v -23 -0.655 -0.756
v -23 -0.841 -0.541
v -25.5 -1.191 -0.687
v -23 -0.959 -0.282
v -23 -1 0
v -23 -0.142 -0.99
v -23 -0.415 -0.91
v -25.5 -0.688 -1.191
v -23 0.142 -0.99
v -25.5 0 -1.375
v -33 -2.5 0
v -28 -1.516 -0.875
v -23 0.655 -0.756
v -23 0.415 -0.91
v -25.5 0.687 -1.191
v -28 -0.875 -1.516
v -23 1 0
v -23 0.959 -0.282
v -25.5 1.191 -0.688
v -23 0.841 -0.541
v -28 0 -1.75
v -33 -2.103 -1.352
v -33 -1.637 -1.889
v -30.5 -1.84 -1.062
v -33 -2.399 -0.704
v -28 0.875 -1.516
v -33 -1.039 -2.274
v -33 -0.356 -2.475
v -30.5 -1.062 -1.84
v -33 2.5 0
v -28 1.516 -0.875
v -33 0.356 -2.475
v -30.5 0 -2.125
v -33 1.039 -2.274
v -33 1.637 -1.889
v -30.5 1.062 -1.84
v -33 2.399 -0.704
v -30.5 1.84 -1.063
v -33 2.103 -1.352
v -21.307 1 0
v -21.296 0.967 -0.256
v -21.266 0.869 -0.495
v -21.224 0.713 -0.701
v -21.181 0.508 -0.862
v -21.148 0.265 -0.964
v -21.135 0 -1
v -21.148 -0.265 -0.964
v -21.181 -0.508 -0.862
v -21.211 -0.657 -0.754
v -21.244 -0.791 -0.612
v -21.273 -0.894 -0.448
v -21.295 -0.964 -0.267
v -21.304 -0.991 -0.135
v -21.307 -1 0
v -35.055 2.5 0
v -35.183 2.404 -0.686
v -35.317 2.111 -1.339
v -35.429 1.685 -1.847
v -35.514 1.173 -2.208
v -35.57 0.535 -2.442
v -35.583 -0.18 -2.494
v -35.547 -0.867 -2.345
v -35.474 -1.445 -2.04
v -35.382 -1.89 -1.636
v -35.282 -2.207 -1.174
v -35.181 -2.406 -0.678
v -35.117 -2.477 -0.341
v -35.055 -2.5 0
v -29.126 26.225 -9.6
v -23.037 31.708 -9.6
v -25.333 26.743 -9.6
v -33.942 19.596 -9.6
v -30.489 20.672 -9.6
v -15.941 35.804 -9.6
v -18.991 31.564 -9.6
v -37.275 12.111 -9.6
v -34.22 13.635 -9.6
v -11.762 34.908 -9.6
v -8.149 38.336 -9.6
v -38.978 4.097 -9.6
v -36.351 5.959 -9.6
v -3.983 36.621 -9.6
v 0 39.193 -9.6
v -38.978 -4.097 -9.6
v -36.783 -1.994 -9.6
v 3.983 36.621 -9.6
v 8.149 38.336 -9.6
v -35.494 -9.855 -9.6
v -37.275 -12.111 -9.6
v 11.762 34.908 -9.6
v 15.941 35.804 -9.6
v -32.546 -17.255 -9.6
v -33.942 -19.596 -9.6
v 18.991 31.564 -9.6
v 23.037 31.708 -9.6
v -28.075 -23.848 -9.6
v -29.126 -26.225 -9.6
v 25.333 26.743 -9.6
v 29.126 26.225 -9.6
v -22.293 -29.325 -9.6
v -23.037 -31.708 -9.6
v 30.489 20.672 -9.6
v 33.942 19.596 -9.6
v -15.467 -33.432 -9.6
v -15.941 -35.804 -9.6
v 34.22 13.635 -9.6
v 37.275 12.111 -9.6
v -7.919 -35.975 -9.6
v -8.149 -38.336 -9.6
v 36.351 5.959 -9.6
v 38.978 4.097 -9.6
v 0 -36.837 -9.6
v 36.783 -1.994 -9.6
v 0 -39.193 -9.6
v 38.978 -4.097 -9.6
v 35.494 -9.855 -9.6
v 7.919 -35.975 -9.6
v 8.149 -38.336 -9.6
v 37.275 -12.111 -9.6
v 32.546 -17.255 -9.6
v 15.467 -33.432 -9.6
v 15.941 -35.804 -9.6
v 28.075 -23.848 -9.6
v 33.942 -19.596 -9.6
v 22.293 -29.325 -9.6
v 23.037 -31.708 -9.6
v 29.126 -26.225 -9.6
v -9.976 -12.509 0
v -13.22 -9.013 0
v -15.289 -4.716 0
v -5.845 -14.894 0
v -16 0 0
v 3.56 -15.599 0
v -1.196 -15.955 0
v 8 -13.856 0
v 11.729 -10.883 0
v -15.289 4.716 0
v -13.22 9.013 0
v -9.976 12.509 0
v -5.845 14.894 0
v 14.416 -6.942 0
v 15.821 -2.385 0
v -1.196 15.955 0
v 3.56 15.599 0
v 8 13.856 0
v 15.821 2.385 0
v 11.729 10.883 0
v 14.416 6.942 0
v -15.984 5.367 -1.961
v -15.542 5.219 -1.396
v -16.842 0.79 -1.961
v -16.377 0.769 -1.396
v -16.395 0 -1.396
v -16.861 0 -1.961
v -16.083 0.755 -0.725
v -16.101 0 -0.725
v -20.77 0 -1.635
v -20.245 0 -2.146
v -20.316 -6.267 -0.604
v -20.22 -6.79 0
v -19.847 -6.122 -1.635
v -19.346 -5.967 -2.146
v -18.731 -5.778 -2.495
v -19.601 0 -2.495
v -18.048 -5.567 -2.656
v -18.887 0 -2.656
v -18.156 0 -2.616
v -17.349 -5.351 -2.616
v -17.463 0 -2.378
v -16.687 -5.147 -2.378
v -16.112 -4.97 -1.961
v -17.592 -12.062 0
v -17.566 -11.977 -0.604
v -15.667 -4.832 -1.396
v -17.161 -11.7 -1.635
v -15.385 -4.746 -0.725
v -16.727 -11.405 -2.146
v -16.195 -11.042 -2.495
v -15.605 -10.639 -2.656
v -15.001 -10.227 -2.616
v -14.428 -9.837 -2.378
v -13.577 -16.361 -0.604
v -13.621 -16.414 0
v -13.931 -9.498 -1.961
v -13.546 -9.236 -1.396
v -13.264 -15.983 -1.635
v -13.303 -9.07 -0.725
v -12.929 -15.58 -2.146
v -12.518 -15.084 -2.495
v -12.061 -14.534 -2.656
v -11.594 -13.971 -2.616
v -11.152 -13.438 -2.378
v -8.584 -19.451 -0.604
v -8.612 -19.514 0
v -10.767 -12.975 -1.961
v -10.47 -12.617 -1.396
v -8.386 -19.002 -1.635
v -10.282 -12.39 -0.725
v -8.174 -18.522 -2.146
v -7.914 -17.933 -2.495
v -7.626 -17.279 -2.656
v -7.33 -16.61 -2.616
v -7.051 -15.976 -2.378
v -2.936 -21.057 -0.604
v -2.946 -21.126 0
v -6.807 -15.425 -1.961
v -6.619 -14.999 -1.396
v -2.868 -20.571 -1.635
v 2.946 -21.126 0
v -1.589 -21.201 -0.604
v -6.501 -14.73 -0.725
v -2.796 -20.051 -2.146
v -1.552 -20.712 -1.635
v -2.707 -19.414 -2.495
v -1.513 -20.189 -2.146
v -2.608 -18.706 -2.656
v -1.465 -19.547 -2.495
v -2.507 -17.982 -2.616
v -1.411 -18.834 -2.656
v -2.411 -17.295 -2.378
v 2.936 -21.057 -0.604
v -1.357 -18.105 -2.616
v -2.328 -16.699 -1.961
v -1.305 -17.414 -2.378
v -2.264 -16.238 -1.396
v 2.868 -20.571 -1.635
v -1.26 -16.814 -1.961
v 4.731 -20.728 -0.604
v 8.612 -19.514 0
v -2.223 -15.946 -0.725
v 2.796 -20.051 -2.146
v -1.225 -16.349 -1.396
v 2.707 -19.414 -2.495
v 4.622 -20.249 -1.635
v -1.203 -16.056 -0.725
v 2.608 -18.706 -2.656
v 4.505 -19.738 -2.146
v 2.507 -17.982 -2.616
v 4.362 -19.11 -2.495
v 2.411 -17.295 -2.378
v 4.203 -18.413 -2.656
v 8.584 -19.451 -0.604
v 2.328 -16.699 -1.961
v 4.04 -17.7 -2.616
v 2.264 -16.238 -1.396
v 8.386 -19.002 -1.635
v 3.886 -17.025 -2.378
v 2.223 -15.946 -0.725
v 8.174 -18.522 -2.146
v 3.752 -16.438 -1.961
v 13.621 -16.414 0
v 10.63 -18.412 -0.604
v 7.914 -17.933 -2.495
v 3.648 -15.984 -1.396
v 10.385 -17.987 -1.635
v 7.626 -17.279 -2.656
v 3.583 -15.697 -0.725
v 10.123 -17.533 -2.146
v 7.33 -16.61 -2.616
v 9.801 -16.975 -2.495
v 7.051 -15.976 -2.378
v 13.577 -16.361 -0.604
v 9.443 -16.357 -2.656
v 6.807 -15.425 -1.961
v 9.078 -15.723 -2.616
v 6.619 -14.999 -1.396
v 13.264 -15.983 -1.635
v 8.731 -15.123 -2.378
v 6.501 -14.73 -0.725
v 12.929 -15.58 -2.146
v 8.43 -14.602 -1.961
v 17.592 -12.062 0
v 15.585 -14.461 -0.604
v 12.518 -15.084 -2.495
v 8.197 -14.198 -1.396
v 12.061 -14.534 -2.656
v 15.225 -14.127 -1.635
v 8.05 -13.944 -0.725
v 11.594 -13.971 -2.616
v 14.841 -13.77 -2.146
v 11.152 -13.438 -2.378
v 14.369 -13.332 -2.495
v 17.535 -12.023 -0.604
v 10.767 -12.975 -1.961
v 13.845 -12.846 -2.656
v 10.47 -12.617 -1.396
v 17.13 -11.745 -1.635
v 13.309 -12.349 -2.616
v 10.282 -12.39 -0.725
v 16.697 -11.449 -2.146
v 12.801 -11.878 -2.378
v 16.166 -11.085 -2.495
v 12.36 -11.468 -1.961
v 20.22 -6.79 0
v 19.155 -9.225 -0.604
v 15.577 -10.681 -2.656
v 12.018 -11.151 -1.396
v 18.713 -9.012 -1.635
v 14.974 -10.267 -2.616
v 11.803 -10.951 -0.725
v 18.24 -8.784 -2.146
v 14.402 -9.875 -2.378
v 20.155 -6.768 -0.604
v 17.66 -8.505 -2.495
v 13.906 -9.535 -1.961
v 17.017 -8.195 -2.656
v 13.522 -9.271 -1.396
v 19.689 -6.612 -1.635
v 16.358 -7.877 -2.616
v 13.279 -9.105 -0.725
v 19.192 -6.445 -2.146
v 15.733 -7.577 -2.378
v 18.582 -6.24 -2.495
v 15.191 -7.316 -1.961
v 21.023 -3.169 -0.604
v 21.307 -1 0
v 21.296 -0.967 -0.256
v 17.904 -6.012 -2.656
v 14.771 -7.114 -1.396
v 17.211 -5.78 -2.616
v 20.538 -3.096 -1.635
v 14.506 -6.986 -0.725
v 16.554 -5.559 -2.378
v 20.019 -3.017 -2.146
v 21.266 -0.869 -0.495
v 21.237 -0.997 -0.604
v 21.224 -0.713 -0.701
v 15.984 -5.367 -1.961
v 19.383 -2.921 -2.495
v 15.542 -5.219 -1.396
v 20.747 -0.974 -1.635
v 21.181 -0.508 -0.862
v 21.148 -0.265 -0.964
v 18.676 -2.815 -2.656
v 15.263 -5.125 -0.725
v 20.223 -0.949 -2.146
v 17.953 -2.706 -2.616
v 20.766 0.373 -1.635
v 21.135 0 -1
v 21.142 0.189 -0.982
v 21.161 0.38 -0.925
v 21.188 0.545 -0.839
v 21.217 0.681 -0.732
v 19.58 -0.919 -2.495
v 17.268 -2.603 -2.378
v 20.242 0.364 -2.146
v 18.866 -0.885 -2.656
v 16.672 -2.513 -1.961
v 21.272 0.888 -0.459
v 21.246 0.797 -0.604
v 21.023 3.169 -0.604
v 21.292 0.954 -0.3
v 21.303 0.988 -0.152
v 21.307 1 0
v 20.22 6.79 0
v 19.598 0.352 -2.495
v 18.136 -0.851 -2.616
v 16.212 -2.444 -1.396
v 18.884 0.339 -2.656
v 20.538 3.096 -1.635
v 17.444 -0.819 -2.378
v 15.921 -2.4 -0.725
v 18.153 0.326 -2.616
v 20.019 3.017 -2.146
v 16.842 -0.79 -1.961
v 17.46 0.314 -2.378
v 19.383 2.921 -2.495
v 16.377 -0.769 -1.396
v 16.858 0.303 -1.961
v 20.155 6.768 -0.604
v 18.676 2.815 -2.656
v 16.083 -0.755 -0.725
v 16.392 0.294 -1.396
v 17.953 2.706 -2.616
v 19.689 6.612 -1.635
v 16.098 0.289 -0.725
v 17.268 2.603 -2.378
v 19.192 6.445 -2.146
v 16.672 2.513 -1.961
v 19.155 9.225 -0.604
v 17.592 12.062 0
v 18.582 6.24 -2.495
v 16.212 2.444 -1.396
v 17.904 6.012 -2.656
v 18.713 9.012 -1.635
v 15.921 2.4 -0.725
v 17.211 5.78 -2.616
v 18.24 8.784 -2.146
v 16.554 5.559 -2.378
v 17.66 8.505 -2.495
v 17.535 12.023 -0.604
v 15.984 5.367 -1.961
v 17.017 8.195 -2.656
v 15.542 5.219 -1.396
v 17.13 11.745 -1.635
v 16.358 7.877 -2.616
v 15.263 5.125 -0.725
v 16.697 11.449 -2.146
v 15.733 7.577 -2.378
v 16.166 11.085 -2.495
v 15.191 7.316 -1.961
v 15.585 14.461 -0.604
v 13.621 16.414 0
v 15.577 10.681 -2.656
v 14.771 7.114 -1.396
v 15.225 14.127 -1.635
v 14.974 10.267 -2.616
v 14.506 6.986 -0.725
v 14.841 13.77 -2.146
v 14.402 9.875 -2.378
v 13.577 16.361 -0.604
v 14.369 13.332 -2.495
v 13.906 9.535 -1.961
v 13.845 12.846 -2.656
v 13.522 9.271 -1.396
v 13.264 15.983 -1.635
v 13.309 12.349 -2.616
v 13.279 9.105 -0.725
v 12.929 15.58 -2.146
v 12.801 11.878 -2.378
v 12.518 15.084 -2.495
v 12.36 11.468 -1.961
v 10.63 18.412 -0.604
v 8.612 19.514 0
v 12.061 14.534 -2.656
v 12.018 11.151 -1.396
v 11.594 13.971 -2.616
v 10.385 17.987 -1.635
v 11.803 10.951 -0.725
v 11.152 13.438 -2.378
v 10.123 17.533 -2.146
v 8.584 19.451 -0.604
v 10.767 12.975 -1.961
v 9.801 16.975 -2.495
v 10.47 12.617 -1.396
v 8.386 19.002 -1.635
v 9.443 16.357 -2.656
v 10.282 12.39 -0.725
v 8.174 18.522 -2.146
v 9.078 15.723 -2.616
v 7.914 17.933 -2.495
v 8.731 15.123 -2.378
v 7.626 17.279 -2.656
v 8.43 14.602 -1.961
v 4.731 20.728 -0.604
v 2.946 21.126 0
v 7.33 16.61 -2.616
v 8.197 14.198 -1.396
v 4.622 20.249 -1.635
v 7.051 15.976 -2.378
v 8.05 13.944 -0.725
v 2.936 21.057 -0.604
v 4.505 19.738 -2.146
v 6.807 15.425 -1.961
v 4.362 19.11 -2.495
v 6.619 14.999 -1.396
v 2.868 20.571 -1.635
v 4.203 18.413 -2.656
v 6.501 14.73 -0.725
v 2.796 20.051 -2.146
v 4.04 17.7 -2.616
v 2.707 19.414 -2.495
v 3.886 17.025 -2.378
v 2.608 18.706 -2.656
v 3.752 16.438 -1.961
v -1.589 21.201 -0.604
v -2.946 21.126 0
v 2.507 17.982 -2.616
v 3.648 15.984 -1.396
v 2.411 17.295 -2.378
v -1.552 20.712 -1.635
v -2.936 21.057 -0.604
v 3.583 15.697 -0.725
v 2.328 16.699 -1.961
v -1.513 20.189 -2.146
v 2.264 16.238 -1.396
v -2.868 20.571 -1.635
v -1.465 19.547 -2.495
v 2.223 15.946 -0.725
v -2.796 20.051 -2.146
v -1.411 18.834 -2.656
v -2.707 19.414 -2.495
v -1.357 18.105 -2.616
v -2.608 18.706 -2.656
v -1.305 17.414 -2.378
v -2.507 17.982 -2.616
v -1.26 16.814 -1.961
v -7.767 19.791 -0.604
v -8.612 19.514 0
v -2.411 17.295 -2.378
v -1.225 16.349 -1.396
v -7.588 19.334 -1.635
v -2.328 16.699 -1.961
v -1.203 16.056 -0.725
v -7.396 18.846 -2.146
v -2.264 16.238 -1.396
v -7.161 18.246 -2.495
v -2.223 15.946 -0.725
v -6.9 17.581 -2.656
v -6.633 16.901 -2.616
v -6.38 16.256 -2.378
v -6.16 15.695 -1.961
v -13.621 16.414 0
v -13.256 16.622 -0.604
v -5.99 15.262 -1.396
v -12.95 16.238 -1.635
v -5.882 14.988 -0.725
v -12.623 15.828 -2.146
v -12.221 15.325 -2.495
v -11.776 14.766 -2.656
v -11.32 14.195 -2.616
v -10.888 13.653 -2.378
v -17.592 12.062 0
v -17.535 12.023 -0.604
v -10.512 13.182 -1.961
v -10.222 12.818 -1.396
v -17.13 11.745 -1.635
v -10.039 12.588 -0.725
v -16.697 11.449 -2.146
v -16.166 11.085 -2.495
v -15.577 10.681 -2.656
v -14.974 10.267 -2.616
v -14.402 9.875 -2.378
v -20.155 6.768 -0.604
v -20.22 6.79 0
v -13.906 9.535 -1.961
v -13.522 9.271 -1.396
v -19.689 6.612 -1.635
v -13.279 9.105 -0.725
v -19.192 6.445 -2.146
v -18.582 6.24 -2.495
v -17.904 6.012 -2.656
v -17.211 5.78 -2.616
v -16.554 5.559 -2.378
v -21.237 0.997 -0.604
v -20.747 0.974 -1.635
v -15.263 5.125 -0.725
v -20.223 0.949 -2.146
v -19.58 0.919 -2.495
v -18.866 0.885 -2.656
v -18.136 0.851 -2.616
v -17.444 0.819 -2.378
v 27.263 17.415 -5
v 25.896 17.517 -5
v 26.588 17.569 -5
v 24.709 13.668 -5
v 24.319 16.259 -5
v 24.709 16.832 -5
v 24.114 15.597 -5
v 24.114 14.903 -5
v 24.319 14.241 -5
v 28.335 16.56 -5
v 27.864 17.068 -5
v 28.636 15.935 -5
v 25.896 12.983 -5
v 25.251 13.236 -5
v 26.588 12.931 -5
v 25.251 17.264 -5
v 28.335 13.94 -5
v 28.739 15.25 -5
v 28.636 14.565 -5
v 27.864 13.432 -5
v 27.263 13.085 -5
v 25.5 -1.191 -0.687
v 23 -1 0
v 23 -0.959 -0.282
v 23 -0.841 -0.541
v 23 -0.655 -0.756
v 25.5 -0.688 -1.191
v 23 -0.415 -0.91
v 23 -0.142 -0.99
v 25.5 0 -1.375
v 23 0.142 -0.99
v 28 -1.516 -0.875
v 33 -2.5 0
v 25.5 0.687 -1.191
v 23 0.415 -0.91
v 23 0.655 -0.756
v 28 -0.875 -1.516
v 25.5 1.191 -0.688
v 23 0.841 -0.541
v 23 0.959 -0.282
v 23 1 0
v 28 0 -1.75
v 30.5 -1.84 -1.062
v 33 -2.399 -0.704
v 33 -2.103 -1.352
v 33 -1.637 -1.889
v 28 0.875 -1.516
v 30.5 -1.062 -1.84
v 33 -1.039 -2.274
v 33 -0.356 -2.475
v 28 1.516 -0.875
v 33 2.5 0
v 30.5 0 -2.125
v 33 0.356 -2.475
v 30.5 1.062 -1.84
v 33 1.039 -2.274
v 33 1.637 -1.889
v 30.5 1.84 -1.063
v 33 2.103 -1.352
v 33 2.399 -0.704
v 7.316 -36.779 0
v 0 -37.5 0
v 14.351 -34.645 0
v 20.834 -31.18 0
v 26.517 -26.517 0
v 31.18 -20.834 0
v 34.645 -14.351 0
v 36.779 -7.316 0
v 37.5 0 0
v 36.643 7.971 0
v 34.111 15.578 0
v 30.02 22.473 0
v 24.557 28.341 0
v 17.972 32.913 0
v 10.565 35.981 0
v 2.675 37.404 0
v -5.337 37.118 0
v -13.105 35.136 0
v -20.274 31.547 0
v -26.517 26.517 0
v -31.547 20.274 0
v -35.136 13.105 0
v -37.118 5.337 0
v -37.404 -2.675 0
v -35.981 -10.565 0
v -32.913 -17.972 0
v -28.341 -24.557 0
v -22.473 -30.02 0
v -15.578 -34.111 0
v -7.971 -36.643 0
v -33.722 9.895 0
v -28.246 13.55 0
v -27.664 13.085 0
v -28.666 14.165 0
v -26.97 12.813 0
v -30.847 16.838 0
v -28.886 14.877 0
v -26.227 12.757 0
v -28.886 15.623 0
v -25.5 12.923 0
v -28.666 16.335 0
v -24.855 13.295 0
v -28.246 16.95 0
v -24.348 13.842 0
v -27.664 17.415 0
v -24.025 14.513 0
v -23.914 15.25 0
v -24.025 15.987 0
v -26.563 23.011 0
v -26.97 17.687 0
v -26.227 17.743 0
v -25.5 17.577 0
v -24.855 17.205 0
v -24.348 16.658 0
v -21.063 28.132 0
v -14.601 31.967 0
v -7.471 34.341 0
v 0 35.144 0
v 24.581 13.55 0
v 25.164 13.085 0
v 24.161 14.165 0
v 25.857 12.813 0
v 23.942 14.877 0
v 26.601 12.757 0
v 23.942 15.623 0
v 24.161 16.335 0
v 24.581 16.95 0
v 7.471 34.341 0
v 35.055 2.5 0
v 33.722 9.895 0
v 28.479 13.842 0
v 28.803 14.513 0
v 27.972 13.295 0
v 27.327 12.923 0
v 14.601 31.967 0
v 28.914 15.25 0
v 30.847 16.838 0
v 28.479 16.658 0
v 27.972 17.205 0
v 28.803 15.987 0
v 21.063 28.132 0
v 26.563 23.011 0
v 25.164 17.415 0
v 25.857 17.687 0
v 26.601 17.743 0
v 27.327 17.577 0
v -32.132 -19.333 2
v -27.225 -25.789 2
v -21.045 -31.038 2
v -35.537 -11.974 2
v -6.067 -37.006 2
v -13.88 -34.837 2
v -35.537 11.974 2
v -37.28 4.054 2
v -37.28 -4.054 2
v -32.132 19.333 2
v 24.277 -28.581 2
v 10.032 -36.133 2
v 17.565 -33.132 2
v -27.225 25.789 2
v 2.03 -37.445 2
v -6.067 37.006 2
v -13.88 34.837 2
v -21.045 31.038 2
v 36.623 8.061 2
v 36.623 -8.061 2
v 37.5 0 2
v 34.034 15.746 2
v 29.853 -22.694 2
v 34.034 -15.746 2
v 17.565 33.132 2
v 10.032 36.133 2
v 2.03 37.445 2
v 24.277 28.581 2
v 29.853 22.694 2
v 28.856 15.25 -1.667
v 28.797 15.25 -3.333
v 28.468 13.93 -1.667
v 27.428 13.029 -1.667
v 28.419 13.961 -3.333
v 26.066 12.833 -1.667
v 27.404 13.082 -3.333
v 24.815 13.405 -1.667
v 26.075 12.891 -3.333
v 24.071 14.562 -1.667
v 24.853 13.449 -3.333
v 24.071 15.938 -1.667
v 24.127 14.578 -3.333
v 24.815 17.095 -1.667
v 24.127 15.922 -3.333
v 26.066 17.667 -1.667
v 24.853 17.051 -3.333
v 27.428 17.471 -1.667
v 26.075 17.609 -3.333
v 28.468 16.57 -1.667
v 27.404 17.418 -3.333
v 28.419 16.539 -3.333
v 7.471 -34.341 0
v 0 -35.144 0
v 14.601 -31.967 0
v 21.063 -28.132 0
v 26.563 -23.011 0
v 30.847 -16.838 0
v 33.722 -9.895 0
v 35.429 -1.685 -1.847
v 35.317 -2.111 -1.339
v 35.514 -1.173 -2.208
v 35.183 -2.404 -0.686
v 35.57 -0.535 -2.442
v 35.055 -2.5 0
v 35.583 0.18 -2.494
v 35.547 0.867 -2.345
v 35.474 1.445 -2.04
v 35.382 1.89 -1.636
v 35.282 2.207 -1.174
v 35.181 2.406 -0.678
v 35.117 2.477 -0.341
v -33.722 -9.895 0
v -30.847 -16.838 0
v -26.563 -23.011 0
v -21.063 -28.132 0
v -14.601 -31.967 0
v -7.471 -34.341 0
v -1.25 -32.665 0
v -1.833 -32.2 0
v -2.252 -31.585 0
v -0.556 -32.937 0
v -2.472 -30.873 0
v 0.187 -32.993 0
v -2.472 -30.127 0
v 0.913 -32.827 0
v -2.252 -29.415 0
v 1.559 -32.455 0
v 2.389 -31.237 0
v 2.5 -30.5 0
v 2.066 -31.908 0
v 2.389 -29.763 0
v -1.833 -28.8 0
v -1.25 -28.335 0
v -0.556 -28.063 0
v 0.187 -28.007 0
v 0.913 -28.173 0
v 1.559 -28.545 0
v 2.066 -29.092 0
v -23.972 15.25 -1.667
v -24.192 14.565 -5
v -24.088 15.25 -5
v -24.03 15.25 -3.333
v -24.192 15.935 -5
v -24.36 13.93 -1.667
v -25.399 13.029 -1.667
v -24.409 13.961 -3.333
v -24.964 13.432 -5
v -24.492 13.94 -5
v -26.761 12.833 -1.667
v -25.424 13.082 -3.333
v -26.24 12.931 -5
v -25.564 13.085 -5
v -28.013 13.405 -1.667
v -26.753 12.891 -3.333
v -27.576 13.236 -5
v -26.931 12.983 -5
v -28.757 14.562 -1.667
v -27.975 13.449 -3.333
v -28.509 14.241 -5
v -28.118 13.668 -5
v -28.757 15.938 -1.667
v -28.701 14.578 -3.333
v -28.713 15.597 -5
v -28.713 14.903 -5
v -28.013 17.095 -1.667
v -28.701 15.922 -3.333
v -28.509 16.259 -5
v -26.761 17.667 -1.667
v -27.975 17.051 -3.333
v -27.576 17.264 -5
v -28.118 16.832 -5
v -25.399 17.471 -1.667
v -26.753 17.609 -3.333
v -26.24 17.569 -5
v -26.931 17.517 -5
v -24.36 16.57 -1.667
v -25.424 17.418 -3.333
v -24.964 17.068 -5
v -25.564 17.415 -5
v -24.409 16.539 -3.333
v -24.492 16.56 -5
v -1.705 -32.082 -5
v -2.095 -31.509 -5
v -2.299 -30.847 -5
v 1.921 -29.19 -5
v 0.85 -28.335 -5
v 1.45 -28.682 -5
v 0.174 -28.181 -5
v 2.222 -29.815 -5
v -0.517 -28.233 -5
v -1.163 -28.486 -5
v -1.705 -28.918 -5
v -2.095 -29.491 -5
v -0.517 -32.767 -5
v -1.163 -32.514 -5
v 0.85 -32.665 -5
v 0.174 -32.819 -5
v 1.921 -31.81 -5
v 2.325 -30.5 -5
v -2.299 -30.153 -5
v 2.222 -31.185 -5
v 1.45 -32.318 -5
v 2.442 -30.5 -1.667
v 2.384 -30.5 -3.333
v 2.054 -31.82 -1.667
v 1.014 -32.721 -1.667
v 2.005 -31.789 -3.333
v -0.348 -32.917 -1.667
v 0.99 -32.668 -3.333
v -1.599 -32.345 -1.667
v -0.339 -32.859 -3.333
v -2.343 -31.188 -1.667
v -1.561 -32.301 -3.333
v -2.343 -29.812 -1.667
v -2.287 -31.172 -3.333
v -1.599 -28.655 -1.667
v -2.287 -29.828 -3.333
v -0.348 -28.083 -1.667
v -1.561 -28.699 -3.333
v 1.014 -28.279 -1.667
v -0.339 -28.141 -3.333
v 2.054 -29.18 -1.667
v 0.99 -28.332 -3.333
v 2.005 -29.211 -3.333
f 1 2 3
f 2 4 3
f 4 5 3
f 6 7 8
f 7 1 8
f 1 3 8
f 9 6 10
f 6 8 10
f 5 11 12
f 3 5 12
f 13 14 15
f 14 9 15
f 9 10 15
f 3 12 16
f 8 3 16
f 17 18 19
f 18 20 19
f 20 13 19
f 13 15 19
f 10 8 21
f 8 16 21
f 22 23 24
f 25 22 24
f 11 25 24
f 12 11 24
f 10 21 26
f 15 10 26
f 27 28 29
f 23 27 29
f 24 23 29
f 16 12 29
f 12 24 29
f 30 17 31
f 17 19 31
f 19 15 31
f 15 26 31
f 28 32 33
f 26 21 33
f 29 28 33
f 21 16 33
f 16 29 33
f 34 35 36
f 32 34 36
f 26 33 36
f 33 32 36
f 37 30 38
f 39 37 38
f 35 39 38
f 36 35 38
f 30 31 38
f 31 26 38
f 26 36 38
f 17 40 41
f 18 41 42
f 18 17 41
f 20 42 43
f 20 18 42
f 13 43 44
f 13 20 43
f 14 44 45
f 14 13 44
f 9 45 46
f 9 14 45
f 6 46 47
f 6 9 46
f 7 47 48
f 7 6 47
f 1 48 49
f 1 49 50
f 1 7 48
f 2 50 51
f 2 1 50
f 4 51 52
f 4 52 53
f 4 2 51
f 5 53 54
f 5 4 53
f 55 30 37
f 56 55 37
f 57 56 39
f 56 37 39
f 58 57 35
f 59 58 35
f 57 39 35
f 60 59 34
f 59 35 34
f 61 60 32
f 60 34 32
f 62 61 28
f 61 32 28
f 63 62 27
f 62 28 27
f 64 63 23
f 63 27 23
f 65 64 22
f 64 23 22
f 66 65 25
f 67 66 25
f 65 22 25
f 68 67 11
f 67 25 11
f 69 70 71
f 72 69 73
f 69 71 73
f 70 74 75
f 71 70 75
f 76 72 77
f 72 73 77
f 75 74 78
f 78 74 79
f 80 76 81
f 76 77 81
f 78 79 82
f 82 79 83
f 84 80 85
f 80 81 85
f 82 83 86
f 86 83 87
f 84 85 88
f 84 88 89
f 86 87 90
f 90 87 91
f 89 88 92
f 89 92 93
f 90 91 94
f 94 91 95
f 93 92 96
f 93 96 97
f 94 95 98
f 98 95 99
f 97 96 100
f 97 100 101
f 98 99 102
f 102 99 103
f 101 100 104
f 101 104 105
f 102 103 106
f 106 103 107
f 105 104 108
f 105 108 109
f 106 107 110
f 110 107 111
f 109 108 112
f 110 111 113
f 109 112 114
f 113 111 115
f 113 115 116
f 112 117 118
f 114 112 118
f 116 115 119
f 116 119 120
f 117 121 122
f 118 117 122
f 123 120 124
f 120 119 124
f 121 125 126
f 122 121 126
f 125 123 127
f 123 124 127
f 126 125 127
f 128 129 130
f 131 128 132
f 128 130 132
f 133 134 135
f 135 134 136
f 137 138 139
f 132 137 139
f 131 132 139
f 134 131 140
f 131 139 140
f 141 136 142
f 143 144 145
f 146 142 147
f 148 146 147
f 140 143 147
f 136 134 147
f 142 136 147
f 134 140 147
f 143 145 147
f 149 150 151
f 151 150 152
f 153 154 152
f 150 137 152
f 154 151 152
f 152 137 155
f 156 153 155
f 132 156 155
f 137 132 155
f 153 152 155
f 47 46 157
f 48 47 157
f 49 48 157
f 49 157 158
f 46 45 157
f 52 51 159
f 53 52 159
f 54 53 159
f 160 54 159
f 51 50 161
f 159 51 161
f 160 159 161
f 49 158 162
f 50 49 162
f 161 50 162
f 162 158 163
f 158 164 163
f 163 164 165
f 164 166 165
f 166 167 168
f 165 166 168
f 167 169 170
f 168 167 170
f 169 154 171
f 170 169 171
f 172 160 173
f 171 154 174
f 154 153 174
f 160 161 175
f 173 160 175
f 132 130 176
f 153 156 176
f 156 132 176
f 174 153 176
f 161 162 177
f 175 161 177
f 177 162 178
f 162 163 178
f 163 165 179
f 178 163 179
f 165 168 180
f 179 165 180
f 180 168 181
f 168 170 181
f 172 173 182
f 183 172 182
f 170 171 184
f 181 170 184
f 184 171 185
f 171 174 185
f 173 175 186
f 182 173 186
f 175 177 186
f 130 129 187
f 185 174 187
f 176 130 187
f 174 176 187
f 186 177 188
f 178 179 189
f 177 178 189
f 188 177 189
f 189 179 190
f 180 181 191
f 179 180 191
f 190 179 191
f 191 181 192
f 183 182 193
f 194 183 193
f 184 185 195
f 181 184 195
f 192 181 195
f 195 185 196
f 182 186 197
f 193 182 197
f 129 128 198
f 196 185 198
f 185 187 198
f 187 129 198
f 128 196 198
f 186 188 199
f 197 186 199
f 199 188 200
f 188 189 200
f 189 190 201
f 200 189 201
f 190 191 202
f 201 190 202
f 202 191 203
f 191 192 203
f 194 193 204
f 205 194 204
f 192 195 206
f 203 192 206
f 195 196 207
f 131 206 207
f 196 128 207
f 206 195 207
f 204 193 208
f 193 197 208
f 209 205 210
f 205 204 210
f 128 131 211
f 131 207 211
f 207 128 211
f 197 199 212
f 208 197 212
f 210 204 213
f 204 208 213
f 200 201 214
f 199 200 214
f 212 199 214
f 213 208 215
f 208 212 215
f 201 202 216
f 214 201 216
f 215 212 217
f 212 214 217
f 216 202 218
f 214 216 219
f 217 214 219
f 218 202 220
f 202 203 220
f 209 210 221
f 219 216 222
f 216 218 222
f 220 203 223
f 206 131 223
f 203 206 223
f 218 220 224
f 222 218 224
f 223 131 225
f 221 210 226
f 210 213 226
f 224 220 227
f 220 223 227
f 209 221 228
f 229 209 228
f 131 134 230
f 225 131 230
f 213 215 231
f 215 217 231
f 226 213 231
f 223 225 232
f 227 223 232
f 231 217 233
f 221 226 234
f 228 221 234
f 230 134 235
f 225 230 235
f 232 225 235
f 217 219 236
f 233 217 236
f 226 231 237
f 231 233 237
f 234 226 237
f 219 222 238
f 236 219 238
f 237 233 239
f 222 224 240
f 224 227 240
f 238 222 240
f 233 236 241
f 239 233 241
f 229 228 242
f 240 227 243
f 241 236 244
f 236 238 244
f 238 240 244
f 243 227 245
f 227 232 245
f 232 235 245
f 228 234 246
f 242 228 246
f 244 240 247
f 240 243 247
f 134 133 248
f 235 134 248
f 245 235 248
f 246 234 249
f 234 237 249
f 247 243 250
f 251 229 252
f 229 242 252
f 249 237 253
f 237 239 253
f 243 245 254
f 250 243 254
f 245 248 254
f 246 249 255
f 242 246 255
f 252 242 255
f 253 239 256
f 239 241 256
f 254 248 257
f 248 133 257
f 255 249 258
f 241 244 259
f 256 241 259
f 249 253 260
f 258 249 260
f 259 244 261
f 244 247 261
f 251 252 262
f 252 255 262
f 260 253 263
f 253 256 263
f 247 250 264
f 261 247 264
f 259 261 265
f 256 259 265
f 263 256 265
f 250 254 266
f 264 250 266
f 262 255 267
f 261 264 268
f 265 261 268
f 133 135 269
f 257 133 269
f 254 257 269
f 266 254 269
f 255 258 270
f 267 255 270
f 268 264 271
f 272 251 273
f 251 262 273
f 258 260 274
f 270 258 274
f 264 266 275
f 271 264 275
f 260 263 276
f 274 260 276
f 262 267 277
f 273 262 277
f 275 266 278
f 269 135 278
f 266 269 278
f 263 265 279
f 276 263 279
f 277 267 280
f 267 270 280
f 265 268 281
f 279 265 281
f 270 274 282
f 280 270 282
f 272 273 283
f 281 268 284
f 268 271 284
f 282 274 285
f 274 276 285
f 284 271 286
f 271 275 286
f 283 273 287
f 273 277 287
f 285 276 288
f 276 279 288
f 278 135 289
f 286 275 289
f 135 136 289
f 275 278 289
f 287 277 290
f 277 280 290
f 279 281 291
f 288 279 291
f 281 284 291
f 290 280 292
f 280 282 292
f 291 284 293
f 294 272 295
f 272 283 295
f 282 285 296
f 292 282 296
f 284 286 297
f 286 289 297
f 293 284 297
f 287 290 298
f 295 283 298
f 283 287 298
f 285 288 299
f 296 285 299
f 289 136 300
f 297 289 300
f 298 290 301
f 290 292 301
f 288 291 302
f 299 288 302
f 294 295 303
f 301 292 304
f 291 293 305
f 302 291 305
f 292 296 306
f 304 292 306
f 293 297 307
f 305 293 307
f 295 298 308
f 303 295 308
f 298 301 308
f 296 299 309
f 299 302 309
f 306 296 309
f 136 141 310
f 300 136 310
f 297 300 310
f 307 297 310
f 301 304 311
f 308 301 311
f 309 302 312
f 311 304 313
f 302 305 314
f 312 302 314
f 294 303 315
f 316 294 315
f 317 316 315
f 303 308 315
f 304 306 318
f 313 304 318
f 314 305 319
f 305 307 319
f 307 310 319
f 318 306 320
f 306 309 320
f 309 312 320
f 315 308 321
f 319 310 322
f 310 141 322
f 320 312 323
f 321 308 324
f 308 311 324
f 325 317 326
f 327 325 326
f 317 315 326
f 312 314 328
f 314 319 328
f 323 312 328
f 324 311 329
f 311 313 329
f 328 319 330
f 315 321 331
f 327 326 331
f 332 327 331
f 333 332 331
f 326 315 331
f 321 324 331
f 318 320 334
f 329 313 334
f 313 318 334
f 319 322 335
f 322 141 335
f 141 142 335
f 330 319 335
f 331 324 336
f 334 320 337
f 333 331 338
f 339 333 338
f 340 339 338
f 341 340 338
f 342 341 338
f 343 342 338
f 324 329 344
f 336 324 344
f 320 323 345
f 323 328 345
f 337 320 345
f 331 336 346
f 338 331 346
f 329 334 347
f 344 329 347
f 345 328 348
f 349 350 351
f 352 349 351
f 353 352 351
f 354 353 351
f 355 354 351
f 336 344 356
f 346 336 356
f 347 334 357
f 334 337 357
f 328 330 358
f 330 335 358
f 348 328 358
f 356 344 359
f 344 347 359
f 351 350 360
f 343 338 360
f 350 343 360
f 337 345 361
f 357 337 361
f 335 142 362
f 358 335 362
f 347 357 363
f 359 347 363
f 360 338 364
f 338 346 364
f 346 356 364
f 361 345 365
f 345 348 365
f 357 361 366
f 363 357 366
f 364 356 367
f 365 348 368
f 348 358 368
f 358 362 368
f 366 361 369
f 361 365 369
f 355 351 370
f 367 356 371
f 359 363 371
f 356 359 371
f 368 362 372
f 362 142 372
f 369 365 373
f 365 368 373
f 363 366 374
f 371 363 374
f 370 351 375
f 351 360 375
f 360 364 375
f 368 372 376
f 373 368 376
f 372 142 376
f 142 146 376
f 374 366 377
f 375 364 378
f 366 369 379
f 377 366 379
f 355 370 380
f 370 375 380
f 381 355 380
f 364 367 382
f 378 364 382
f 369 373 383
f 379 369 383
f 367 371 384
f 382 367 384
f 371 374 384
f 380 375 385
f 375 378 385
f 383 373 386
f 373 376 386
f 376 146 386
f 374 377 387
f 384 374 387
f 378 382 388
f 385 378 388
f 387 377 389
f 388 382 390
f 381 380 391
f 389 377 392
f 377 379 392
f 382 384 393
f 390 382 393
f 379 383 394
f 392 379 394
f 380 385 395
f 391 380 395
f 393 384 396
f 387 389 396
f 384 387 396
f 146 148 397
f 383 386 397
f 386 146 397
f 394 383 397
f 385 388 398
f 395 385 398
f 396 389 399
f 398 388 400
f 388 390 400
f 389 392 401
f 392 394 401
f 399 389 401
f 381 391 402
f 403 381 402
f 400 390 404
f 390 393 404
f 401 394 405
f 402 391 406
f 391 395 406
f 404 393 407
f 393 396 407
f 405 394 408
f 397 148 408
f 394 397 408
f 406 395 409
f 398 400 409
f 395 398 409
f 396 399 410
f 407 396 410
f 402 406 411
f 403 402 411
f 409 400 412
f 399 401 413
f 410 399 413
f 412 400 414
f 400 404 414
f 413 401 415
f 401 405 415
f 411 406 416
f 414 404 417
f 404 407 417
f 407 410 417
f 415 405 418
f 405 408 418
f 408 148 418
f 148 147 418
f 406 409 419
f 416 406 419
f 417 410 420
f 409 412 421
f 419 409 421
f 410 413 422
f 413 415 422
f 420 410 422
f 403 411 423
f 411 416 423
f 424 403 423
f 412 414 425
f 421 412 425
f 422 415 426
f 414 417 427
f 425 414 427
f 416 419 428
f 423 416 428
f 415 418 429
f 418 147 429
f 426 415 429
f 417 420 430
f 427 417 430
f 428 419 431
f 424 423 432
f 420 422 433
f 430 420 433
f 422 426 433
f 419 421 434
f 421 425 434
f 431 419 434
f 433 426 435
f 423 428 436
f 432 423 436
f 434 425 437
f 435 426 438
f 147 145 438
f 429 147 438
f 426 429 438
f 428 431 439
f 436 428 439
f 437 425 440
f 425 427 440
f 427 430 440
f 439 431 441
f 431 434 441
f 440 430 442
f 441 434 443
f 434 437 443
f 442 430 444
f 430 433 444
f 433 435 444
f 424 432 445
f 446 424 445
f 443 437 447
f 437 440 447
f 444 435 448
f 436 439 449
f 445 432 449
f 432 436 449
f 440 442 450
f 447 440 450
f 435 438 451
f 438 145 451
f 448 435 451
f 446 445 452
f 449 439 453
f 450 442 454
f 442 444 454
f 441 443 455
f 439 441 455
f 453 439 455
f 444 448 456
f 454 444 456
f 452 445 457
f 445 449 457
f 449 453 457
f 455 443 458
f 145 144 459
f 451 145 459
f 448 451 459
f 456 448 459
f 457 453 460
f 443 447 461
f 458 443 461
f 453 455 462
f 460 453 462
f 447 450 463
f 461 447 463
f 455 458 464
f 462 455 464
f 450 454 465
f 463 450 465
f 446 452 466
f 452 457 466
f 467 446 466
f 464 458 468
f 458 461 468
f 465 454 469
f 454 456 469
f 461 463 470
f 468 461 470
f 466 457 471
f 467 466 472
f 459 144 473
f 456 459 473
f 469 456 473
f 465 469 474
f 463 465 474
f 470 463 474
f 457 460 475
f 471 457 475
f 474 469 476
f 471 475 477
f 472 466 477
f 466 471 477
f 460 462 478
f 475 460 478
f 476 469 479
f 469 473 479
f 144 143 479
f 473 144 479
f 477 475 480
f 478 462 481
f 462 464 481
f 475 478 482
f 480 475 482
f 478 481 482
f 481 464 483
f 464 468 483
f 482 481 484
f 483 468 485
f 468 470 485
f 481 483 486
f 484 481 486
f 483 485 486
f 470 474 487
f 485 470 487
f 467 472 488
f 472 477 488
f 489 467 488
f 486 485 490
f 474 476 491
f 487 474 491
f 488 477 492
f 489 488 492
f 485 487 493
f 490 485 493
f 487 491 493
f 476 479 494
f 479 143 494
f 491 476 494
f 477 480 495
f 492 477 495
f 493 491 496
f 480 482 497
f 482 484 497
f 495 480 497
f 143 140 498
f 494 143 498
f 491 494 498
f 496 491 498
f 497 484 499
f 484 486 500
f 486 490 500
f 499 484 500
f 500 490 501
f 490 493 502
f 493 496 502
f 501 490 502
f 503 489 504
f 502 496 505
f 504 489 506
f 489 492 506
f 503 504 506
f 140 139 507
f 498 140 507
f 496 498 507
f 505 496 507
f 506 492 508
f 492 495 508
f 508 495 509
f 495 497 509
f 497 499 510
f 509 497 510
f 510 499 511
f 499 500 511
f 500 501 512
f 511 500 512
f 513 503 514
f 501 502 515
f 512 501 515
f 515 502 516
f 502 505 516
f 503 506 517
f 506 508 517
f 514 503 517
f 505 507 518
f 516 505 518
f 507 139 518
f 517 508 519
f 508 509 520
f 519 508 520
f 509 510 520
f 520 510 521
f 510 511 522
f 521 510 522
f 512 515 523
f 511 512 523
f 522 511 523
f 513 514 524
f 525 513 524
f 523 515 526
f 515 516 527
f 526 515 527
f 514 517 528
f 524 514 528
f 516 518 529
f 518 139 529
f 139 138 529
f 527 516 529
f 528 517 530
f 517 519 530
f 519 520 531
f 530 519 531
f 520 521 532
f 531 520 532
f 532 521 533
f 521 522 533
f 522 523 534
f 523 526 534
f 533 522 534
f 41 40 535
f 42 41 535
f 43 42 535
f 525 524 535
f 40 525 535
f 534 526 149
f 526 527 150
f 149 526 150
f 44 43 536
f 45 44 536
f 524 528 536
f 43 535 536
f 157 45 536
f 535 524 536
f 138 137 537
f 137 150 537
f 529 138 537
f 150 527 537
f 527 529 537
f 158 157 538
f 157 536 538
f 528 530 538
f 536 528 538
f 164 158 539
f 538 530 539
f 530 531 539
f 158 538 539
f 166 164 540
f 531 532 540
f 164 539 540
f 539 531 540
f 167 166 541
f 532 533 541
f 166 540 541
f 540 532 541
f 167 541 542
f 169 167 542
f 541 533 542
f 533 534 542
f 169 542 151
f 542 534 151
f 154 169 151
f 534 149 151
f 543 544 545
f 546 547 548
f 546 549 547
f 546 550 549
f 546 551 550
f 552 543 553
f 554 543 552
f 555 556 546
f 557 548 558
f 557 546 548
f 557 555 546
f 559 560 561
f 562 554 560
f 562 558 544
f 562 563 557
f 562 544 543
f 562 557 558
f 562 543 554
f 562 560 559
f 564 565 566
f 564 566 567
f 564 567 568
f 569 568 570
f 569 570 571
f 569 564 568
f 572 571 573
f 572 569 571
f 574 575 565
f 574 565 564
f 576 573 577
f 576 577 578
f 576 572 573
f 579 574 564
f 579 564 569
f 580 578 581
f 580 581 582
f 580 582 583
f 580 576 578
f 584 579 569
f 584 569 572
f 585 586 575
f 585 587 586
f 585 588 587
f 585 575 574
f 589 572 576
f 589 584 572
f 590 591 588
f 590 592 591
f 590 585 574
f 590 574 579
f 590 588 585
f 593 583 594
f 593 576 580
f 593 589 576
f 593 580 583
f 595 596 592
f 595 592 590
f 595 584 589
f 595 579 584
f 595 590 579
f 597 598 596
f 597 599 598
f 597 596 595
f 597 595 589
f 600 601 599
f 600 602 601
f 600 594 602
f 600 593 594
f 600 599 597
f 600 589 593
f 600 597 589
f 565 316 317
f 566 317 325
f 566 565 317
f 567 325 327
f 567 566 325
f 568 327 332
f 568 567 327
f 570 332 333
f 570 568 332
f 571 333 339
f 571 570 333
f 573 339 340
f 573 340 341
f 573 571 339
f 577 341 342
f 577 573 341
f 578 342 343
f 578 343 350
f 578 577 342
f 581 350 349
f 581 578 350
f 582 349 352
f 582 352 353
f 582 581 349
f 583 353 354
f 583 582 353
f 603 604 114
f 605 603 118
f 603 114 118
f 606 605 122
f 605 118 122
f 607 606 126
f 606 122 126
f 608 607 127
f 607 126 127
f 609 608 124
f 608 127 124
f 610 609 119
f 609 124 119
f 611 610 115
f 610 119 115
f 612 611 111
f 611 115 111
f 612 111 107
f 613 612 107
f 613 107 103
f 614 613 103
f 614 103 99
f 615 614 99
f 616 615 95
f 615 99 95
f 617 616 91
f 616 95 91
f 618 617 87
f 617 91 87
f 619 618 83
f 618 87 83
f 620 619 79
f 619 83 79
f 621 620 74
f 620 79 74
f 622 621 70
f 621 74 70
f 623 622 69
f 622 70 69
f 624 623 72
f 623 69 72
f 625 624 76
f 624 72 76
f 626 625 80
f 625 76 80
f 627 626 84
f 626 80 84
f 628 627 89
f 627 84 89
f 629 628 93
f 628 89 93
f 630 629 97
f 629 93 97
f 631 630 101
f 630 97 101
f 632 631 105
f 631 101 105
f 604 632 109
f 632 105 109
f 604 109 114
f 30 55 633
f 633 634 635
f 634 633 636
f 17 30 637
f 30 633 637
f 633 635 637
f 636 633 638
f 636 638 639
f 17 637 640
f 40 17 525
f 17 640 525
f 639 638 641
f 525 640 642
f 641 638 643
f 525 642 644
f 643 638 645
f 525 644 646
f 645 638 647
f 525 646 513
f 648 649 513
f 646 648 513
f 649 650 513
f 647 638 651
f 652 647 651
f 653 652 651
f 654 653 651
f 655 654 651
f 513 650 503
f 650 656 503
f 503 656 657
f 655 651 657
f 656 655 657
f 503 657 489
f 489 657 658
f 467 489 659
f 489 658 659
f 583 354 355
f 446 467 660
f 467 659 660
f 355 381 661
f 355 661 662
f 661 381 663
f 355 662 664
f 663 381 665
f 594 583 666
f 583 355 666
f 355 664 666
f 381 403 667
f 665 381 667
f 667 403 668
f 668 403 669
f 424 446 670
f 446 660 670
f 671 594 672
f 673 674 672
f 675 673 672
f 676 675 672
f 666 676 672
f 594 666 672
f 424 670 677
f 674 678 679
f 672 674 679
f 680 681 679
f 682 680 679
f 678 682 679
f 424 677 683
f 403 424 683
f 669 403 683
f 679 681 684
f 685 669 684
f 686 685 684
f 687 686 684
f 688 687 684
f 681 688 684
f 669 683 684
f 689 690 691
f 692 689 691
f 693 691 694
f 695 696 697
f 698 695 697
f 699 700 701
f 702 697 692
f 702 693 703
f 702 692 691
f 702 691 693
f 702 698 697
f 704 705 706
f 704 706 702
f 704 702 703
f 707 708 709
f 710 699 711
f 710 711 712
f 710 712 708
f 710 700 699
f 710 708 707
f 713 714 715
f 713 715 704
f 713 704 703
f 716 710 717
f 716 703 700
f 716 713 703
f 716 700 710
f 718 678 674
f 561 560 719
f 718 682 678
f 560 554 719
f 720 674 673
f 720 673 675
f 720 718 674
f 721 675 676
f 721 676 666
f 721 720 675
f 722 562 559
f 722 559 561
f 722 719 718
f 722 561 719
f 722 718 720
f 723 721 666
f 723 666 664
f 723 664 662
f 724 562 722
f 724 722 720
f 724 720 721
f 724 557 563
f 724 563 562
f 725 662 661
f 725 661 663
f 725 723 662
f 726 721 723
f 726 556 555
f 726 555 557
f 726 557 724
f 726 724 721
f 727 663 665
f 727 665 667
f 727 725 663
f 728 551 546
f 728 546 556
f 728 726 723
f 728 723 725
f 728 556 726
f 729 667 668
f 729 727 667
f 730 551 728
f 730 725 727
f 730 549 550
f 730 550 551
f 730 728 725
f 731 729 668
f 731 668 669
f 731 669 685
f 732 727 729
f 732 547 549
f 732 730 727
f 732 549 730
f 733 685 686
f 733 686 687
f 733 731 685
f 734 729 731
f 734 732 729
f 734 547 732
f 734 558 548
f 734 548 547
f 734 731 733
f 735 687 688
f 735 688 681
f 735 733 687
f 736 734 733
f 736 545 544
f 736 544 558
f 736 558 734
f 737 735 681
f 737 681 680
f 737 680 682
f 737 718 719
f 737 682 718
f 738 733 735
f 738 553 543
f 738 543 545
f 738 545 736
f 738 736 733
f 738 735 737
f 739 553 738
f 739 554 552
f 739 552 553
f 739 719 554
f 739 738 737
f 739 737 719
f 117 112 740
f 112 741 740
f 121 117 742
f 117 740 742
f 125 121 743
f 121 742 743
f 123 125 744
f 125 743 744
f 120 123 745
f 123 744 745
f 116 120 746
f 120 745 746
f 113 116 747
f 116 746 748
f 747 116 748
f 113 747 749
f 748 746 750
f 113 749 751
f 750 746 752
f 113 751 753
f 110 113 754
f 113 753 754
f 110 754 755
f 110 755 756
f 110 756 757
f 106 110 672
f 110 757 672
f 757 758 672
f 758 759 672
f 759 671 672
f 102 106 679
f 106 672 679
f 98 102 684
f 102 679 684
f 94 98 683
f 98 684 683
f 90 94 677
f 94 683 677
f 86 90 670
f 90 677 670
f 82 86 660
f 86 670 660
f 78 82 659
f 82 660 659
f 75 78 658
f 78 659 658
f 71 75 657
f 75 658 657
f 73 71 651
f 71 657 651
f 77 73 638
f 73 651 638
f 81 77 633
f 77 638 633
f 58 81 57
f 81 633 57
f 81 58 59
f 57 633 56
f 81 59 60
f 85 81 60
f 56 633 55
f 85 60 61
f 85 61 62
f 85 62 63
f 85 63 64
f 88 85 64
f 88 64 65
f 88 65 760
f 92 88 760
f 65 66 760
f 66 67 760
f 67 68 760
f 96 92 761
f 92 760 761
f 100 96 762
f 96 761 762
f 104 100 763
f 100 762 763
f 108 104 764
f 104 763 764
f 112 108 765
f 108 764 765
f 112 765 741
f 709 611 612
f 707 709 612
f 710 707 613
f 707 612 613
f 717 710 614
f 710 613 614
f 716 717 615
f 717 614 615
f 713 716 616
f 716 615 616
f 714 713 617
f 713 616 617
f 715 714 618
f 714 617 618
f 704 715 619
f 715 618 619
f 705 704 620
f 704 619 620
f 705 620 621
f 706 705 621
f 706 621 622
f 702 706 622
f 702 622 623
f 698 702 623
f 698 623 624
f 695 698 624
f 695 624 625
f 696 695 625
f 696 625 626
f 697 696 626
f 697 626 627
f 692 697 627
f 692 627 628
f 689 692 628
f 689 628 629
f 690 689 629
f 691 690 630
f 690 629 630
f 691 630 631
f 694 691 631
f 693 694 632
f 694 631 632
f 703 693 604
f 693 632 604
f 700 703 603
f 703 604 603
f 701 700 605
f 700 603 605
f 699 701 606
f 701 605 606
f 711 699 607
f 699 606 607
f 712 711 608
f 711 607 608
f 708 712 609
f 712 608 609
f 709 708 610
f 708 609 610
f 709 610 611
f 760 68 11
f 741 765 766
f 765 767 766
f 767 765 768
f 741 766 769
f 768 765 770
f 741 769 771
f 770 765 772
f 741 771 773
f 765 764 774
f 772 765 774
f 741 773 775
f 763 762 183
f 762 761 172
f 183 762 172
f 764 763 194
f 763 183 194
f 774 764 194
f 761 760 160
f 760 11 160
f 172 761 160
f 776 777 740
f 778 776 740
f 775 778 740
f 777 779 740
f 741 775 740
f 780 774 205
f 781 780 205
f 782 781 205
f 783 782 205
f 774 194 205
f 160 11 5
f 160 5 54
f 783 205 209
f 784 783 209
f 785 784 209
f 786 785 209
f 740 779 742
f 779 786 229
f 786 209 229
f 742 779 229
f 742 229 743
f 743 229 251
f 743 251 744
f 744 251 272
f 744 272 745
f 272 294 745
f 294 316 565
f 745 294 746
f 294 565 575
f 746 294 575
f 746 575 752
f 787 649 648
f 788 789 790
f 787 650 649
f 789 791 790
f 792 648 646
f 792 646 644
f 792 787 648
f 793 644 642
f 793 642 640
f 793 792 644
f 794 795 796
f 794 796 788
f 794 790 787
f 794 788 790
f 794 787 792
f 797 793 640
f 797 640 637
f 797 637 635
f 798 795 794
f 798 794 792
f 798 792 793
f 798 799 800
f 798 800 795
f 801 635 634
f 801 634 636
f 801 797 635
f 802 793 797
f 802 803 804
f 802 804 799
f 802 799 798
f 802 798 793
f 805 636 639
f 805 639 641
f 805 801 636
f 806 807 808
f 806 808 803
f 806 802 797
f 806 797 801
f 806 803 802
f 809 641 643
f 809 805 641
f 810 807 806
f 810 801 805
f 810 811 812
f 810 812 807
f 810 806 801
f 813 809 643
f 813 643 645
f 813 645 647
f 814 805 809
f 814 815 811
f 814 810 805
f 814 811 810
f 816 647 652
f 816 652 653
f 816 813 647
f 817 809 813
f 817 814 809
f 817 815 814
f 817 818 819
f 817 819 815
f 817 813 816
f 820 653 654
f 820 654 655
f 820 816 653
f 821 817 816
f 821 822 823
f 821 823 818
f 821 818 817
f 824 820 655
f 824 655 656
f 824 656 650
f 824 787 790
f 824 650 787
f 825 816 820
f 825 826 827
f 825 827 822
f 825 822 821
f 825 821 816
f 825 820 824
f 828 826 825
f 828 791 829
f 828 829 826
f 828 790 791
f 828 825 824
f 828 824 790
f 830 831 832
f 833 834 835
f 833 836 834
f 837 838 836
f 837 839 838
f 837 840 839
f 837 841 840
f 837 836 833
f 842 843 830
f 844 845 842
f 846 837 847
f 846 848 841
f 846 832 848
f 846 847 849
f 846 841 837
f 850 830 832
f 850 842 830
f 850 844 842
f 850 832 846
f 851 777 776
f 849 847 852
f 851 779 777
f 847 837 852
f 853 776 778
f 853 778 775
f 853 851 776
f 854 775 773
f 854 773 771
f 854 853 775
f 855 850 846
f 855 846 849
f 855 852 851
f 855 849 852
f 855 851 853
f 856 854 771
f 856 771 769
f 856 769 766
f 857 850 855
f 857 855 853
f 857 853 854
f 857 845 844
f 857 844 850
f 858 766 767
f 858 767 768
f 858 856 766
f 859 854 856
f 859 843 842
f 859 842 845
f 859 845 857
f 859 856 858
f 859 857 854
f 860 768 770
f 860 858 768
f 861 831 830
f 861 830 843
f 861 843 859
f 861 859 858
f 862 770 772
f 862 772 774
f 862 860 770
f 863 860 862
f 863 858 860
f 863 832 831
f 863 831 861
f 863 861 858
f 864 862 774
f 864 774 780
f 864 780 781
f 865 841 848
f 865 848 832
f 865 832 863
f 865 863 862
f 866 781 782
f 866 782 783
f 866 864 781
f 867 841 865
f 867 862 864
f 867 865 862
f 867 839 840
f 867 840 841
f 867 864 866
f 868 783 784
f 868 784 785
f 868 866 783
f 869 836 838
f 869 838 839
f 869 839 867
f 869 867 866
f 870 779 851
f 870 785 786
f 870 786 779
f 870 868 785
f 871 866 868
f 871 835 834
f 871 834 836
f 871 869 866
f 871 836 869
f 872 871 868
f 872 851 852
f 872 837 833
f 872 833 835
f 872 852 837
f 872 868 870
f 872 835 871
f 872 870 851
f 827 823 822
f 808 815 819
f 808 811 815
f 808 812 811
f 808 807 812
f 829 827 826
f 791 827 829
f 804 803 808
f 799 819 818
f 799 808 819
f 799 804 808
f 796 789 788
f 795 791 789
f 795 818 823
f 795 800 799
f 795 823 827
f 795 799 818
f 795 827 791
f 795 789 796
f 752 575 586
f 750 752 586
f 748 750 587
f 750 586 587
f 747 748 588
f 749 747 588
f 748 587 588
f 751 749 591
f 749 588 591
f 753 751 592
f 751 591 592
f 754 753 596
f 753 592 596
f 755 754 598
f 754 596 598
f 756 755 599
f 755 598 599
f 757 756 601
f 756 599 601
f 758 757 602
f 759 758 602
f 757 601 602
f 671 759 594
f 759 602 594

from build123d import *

# Parameters (mm, degrees)
F3_R             = 37.5
F4_DEPTH         = 2
F7_R             = 2.5
F8_DEPTH         = 5
F8_TAPER         = 2
F12_COPIES_COUNT = 2
F14_COPIES_COUNT = 2


# Not quite as in the source:
# - a pattern or mirror of a feature is missing from the dataset's text; its kind, count and spacing are read off the source's solid


with BuildPart() as f2:
    # F1 (on Front) → F2 (revolve)
    with BuildSketch(Plane.XZ):
        with BuildLine():
            Line((-16, 0), (-21.33, 0))
            ThreePointArc((-21.33, 0), (-18.665, -2.665), (-16, 0))
        make_face()
    revolve(axis=Axis((0, 0, 18.396249041), (0, 0, 1)))

    # F3 (on face) → F4 (join)
    with BuildSketch(Plane.XY):
        Circle(F3_R)
    extrude(amount=F4_DEPTH)

    # F5 (on Right) → F6 (revolve)
    with BuildSketch(Plane.YZ):
        Polygon((-36.8366060944, -9.6), (-35.1438670796, 0), (-37.5, 0), (-39.1927390148, -9.6), align=None)
    revolve(axis=Axis((0, 0, 18.396249041), (0, 0, 1)))

    # F7 (on face) → F8 (join)
    with BuildSketch(Plane(origin=(0, 0, 0), x_dir=(1, 0, 0), z_dir=(0, 0, -1))):
        with Locations((0, 30.5)):
            Circle(F7_R)
        with Locations((-26.4137748154, -15.25)):
            Circle(F7_R)
        with Locations((26.4137748154, -15.25)):
            Circle(F7_R)
    extrude(amount=F8_DEPTH, taper=F8_TAPER)

    # F11 (on offset) → F12 (join, up to the next surface of F2)
    with BuildSketch(Plane.YZ.offset(33)):
        with BuildLine():
            Line((2.5, 0), (-2.5, 0))
            ThreePointArc((-2.5, 0), (0, -2.5), (2.5, 0))
        make_face()
    f12 = extrude(until=Until.NEXT)

    # F12_copies: F12 ×2 about axis
    f12_copies_axis = Axis((0, 0, 0), (0, 0, 1))
    for i in range(1, F12_COPIES_COUNT):
        add(f12.rotate(f12_copies_axis, i * 360 / F12_COPIES_COUNT))

    # F13 (on offset) → F14 (join, up to the next surface of F2)
    with BuildSketch(Plane.YZ.offset(23)):
        with BuildLine():
            Line((1, 0), (-1, 0))
            ThreePointArc((-1, 0), (0, -1), (1, 0))
        make_face()
    f14 = extrude(until=Until.NEXT, dir=(-1, 0, 0))

    # F14_copies: F14 ×2 about axis
    f14_copies_axis = Axis((0, 0, 0), (0, 0, 1))
    for i in range(1, F14_COPIES_COUNT):
        add(f14.rotate(f14_copies_axis, i * 360 / F14_COPIES_COUNT))

    # F14_face (on face) → F15 section 0
    with BuildSketch(Plane(origin=(23, 0, -0.4244131816), x_dir=(0, 1, 0), z_dir=(1, 0, 0))):
        with BuildLine():
            Line((1, 0.4244131816), (-1, 0.4244131816))
            ThreePointArc((-1, 0.4244131816), (0, -0.5755868184), (1, 0.4244131816))
        make_face()
    # F12_face (on face) → F15 section 1
    with BuildSketch(Plane(origin=(33, 0, -1.0610329539), x_dir=(0, 1, 0), z_dir=(-1, 0, 0))):
        with BuildLine():
            Line((-2.5, -1.0610329539), (2.5, -1.0610329539))
            ThreePointArc((2.5, -1.0610329539), (0, 1.4389670461), (-2.5, -1.0610329539))
        make_face()
    f15 = loft()

    # F15_copies: F15 across plane
    add(f15.mirror(Plane(origin=(0, 0, 0), x_dir=(0, 0, -1), z_dir=(-1, 0, 0))))


solid = f2.part
